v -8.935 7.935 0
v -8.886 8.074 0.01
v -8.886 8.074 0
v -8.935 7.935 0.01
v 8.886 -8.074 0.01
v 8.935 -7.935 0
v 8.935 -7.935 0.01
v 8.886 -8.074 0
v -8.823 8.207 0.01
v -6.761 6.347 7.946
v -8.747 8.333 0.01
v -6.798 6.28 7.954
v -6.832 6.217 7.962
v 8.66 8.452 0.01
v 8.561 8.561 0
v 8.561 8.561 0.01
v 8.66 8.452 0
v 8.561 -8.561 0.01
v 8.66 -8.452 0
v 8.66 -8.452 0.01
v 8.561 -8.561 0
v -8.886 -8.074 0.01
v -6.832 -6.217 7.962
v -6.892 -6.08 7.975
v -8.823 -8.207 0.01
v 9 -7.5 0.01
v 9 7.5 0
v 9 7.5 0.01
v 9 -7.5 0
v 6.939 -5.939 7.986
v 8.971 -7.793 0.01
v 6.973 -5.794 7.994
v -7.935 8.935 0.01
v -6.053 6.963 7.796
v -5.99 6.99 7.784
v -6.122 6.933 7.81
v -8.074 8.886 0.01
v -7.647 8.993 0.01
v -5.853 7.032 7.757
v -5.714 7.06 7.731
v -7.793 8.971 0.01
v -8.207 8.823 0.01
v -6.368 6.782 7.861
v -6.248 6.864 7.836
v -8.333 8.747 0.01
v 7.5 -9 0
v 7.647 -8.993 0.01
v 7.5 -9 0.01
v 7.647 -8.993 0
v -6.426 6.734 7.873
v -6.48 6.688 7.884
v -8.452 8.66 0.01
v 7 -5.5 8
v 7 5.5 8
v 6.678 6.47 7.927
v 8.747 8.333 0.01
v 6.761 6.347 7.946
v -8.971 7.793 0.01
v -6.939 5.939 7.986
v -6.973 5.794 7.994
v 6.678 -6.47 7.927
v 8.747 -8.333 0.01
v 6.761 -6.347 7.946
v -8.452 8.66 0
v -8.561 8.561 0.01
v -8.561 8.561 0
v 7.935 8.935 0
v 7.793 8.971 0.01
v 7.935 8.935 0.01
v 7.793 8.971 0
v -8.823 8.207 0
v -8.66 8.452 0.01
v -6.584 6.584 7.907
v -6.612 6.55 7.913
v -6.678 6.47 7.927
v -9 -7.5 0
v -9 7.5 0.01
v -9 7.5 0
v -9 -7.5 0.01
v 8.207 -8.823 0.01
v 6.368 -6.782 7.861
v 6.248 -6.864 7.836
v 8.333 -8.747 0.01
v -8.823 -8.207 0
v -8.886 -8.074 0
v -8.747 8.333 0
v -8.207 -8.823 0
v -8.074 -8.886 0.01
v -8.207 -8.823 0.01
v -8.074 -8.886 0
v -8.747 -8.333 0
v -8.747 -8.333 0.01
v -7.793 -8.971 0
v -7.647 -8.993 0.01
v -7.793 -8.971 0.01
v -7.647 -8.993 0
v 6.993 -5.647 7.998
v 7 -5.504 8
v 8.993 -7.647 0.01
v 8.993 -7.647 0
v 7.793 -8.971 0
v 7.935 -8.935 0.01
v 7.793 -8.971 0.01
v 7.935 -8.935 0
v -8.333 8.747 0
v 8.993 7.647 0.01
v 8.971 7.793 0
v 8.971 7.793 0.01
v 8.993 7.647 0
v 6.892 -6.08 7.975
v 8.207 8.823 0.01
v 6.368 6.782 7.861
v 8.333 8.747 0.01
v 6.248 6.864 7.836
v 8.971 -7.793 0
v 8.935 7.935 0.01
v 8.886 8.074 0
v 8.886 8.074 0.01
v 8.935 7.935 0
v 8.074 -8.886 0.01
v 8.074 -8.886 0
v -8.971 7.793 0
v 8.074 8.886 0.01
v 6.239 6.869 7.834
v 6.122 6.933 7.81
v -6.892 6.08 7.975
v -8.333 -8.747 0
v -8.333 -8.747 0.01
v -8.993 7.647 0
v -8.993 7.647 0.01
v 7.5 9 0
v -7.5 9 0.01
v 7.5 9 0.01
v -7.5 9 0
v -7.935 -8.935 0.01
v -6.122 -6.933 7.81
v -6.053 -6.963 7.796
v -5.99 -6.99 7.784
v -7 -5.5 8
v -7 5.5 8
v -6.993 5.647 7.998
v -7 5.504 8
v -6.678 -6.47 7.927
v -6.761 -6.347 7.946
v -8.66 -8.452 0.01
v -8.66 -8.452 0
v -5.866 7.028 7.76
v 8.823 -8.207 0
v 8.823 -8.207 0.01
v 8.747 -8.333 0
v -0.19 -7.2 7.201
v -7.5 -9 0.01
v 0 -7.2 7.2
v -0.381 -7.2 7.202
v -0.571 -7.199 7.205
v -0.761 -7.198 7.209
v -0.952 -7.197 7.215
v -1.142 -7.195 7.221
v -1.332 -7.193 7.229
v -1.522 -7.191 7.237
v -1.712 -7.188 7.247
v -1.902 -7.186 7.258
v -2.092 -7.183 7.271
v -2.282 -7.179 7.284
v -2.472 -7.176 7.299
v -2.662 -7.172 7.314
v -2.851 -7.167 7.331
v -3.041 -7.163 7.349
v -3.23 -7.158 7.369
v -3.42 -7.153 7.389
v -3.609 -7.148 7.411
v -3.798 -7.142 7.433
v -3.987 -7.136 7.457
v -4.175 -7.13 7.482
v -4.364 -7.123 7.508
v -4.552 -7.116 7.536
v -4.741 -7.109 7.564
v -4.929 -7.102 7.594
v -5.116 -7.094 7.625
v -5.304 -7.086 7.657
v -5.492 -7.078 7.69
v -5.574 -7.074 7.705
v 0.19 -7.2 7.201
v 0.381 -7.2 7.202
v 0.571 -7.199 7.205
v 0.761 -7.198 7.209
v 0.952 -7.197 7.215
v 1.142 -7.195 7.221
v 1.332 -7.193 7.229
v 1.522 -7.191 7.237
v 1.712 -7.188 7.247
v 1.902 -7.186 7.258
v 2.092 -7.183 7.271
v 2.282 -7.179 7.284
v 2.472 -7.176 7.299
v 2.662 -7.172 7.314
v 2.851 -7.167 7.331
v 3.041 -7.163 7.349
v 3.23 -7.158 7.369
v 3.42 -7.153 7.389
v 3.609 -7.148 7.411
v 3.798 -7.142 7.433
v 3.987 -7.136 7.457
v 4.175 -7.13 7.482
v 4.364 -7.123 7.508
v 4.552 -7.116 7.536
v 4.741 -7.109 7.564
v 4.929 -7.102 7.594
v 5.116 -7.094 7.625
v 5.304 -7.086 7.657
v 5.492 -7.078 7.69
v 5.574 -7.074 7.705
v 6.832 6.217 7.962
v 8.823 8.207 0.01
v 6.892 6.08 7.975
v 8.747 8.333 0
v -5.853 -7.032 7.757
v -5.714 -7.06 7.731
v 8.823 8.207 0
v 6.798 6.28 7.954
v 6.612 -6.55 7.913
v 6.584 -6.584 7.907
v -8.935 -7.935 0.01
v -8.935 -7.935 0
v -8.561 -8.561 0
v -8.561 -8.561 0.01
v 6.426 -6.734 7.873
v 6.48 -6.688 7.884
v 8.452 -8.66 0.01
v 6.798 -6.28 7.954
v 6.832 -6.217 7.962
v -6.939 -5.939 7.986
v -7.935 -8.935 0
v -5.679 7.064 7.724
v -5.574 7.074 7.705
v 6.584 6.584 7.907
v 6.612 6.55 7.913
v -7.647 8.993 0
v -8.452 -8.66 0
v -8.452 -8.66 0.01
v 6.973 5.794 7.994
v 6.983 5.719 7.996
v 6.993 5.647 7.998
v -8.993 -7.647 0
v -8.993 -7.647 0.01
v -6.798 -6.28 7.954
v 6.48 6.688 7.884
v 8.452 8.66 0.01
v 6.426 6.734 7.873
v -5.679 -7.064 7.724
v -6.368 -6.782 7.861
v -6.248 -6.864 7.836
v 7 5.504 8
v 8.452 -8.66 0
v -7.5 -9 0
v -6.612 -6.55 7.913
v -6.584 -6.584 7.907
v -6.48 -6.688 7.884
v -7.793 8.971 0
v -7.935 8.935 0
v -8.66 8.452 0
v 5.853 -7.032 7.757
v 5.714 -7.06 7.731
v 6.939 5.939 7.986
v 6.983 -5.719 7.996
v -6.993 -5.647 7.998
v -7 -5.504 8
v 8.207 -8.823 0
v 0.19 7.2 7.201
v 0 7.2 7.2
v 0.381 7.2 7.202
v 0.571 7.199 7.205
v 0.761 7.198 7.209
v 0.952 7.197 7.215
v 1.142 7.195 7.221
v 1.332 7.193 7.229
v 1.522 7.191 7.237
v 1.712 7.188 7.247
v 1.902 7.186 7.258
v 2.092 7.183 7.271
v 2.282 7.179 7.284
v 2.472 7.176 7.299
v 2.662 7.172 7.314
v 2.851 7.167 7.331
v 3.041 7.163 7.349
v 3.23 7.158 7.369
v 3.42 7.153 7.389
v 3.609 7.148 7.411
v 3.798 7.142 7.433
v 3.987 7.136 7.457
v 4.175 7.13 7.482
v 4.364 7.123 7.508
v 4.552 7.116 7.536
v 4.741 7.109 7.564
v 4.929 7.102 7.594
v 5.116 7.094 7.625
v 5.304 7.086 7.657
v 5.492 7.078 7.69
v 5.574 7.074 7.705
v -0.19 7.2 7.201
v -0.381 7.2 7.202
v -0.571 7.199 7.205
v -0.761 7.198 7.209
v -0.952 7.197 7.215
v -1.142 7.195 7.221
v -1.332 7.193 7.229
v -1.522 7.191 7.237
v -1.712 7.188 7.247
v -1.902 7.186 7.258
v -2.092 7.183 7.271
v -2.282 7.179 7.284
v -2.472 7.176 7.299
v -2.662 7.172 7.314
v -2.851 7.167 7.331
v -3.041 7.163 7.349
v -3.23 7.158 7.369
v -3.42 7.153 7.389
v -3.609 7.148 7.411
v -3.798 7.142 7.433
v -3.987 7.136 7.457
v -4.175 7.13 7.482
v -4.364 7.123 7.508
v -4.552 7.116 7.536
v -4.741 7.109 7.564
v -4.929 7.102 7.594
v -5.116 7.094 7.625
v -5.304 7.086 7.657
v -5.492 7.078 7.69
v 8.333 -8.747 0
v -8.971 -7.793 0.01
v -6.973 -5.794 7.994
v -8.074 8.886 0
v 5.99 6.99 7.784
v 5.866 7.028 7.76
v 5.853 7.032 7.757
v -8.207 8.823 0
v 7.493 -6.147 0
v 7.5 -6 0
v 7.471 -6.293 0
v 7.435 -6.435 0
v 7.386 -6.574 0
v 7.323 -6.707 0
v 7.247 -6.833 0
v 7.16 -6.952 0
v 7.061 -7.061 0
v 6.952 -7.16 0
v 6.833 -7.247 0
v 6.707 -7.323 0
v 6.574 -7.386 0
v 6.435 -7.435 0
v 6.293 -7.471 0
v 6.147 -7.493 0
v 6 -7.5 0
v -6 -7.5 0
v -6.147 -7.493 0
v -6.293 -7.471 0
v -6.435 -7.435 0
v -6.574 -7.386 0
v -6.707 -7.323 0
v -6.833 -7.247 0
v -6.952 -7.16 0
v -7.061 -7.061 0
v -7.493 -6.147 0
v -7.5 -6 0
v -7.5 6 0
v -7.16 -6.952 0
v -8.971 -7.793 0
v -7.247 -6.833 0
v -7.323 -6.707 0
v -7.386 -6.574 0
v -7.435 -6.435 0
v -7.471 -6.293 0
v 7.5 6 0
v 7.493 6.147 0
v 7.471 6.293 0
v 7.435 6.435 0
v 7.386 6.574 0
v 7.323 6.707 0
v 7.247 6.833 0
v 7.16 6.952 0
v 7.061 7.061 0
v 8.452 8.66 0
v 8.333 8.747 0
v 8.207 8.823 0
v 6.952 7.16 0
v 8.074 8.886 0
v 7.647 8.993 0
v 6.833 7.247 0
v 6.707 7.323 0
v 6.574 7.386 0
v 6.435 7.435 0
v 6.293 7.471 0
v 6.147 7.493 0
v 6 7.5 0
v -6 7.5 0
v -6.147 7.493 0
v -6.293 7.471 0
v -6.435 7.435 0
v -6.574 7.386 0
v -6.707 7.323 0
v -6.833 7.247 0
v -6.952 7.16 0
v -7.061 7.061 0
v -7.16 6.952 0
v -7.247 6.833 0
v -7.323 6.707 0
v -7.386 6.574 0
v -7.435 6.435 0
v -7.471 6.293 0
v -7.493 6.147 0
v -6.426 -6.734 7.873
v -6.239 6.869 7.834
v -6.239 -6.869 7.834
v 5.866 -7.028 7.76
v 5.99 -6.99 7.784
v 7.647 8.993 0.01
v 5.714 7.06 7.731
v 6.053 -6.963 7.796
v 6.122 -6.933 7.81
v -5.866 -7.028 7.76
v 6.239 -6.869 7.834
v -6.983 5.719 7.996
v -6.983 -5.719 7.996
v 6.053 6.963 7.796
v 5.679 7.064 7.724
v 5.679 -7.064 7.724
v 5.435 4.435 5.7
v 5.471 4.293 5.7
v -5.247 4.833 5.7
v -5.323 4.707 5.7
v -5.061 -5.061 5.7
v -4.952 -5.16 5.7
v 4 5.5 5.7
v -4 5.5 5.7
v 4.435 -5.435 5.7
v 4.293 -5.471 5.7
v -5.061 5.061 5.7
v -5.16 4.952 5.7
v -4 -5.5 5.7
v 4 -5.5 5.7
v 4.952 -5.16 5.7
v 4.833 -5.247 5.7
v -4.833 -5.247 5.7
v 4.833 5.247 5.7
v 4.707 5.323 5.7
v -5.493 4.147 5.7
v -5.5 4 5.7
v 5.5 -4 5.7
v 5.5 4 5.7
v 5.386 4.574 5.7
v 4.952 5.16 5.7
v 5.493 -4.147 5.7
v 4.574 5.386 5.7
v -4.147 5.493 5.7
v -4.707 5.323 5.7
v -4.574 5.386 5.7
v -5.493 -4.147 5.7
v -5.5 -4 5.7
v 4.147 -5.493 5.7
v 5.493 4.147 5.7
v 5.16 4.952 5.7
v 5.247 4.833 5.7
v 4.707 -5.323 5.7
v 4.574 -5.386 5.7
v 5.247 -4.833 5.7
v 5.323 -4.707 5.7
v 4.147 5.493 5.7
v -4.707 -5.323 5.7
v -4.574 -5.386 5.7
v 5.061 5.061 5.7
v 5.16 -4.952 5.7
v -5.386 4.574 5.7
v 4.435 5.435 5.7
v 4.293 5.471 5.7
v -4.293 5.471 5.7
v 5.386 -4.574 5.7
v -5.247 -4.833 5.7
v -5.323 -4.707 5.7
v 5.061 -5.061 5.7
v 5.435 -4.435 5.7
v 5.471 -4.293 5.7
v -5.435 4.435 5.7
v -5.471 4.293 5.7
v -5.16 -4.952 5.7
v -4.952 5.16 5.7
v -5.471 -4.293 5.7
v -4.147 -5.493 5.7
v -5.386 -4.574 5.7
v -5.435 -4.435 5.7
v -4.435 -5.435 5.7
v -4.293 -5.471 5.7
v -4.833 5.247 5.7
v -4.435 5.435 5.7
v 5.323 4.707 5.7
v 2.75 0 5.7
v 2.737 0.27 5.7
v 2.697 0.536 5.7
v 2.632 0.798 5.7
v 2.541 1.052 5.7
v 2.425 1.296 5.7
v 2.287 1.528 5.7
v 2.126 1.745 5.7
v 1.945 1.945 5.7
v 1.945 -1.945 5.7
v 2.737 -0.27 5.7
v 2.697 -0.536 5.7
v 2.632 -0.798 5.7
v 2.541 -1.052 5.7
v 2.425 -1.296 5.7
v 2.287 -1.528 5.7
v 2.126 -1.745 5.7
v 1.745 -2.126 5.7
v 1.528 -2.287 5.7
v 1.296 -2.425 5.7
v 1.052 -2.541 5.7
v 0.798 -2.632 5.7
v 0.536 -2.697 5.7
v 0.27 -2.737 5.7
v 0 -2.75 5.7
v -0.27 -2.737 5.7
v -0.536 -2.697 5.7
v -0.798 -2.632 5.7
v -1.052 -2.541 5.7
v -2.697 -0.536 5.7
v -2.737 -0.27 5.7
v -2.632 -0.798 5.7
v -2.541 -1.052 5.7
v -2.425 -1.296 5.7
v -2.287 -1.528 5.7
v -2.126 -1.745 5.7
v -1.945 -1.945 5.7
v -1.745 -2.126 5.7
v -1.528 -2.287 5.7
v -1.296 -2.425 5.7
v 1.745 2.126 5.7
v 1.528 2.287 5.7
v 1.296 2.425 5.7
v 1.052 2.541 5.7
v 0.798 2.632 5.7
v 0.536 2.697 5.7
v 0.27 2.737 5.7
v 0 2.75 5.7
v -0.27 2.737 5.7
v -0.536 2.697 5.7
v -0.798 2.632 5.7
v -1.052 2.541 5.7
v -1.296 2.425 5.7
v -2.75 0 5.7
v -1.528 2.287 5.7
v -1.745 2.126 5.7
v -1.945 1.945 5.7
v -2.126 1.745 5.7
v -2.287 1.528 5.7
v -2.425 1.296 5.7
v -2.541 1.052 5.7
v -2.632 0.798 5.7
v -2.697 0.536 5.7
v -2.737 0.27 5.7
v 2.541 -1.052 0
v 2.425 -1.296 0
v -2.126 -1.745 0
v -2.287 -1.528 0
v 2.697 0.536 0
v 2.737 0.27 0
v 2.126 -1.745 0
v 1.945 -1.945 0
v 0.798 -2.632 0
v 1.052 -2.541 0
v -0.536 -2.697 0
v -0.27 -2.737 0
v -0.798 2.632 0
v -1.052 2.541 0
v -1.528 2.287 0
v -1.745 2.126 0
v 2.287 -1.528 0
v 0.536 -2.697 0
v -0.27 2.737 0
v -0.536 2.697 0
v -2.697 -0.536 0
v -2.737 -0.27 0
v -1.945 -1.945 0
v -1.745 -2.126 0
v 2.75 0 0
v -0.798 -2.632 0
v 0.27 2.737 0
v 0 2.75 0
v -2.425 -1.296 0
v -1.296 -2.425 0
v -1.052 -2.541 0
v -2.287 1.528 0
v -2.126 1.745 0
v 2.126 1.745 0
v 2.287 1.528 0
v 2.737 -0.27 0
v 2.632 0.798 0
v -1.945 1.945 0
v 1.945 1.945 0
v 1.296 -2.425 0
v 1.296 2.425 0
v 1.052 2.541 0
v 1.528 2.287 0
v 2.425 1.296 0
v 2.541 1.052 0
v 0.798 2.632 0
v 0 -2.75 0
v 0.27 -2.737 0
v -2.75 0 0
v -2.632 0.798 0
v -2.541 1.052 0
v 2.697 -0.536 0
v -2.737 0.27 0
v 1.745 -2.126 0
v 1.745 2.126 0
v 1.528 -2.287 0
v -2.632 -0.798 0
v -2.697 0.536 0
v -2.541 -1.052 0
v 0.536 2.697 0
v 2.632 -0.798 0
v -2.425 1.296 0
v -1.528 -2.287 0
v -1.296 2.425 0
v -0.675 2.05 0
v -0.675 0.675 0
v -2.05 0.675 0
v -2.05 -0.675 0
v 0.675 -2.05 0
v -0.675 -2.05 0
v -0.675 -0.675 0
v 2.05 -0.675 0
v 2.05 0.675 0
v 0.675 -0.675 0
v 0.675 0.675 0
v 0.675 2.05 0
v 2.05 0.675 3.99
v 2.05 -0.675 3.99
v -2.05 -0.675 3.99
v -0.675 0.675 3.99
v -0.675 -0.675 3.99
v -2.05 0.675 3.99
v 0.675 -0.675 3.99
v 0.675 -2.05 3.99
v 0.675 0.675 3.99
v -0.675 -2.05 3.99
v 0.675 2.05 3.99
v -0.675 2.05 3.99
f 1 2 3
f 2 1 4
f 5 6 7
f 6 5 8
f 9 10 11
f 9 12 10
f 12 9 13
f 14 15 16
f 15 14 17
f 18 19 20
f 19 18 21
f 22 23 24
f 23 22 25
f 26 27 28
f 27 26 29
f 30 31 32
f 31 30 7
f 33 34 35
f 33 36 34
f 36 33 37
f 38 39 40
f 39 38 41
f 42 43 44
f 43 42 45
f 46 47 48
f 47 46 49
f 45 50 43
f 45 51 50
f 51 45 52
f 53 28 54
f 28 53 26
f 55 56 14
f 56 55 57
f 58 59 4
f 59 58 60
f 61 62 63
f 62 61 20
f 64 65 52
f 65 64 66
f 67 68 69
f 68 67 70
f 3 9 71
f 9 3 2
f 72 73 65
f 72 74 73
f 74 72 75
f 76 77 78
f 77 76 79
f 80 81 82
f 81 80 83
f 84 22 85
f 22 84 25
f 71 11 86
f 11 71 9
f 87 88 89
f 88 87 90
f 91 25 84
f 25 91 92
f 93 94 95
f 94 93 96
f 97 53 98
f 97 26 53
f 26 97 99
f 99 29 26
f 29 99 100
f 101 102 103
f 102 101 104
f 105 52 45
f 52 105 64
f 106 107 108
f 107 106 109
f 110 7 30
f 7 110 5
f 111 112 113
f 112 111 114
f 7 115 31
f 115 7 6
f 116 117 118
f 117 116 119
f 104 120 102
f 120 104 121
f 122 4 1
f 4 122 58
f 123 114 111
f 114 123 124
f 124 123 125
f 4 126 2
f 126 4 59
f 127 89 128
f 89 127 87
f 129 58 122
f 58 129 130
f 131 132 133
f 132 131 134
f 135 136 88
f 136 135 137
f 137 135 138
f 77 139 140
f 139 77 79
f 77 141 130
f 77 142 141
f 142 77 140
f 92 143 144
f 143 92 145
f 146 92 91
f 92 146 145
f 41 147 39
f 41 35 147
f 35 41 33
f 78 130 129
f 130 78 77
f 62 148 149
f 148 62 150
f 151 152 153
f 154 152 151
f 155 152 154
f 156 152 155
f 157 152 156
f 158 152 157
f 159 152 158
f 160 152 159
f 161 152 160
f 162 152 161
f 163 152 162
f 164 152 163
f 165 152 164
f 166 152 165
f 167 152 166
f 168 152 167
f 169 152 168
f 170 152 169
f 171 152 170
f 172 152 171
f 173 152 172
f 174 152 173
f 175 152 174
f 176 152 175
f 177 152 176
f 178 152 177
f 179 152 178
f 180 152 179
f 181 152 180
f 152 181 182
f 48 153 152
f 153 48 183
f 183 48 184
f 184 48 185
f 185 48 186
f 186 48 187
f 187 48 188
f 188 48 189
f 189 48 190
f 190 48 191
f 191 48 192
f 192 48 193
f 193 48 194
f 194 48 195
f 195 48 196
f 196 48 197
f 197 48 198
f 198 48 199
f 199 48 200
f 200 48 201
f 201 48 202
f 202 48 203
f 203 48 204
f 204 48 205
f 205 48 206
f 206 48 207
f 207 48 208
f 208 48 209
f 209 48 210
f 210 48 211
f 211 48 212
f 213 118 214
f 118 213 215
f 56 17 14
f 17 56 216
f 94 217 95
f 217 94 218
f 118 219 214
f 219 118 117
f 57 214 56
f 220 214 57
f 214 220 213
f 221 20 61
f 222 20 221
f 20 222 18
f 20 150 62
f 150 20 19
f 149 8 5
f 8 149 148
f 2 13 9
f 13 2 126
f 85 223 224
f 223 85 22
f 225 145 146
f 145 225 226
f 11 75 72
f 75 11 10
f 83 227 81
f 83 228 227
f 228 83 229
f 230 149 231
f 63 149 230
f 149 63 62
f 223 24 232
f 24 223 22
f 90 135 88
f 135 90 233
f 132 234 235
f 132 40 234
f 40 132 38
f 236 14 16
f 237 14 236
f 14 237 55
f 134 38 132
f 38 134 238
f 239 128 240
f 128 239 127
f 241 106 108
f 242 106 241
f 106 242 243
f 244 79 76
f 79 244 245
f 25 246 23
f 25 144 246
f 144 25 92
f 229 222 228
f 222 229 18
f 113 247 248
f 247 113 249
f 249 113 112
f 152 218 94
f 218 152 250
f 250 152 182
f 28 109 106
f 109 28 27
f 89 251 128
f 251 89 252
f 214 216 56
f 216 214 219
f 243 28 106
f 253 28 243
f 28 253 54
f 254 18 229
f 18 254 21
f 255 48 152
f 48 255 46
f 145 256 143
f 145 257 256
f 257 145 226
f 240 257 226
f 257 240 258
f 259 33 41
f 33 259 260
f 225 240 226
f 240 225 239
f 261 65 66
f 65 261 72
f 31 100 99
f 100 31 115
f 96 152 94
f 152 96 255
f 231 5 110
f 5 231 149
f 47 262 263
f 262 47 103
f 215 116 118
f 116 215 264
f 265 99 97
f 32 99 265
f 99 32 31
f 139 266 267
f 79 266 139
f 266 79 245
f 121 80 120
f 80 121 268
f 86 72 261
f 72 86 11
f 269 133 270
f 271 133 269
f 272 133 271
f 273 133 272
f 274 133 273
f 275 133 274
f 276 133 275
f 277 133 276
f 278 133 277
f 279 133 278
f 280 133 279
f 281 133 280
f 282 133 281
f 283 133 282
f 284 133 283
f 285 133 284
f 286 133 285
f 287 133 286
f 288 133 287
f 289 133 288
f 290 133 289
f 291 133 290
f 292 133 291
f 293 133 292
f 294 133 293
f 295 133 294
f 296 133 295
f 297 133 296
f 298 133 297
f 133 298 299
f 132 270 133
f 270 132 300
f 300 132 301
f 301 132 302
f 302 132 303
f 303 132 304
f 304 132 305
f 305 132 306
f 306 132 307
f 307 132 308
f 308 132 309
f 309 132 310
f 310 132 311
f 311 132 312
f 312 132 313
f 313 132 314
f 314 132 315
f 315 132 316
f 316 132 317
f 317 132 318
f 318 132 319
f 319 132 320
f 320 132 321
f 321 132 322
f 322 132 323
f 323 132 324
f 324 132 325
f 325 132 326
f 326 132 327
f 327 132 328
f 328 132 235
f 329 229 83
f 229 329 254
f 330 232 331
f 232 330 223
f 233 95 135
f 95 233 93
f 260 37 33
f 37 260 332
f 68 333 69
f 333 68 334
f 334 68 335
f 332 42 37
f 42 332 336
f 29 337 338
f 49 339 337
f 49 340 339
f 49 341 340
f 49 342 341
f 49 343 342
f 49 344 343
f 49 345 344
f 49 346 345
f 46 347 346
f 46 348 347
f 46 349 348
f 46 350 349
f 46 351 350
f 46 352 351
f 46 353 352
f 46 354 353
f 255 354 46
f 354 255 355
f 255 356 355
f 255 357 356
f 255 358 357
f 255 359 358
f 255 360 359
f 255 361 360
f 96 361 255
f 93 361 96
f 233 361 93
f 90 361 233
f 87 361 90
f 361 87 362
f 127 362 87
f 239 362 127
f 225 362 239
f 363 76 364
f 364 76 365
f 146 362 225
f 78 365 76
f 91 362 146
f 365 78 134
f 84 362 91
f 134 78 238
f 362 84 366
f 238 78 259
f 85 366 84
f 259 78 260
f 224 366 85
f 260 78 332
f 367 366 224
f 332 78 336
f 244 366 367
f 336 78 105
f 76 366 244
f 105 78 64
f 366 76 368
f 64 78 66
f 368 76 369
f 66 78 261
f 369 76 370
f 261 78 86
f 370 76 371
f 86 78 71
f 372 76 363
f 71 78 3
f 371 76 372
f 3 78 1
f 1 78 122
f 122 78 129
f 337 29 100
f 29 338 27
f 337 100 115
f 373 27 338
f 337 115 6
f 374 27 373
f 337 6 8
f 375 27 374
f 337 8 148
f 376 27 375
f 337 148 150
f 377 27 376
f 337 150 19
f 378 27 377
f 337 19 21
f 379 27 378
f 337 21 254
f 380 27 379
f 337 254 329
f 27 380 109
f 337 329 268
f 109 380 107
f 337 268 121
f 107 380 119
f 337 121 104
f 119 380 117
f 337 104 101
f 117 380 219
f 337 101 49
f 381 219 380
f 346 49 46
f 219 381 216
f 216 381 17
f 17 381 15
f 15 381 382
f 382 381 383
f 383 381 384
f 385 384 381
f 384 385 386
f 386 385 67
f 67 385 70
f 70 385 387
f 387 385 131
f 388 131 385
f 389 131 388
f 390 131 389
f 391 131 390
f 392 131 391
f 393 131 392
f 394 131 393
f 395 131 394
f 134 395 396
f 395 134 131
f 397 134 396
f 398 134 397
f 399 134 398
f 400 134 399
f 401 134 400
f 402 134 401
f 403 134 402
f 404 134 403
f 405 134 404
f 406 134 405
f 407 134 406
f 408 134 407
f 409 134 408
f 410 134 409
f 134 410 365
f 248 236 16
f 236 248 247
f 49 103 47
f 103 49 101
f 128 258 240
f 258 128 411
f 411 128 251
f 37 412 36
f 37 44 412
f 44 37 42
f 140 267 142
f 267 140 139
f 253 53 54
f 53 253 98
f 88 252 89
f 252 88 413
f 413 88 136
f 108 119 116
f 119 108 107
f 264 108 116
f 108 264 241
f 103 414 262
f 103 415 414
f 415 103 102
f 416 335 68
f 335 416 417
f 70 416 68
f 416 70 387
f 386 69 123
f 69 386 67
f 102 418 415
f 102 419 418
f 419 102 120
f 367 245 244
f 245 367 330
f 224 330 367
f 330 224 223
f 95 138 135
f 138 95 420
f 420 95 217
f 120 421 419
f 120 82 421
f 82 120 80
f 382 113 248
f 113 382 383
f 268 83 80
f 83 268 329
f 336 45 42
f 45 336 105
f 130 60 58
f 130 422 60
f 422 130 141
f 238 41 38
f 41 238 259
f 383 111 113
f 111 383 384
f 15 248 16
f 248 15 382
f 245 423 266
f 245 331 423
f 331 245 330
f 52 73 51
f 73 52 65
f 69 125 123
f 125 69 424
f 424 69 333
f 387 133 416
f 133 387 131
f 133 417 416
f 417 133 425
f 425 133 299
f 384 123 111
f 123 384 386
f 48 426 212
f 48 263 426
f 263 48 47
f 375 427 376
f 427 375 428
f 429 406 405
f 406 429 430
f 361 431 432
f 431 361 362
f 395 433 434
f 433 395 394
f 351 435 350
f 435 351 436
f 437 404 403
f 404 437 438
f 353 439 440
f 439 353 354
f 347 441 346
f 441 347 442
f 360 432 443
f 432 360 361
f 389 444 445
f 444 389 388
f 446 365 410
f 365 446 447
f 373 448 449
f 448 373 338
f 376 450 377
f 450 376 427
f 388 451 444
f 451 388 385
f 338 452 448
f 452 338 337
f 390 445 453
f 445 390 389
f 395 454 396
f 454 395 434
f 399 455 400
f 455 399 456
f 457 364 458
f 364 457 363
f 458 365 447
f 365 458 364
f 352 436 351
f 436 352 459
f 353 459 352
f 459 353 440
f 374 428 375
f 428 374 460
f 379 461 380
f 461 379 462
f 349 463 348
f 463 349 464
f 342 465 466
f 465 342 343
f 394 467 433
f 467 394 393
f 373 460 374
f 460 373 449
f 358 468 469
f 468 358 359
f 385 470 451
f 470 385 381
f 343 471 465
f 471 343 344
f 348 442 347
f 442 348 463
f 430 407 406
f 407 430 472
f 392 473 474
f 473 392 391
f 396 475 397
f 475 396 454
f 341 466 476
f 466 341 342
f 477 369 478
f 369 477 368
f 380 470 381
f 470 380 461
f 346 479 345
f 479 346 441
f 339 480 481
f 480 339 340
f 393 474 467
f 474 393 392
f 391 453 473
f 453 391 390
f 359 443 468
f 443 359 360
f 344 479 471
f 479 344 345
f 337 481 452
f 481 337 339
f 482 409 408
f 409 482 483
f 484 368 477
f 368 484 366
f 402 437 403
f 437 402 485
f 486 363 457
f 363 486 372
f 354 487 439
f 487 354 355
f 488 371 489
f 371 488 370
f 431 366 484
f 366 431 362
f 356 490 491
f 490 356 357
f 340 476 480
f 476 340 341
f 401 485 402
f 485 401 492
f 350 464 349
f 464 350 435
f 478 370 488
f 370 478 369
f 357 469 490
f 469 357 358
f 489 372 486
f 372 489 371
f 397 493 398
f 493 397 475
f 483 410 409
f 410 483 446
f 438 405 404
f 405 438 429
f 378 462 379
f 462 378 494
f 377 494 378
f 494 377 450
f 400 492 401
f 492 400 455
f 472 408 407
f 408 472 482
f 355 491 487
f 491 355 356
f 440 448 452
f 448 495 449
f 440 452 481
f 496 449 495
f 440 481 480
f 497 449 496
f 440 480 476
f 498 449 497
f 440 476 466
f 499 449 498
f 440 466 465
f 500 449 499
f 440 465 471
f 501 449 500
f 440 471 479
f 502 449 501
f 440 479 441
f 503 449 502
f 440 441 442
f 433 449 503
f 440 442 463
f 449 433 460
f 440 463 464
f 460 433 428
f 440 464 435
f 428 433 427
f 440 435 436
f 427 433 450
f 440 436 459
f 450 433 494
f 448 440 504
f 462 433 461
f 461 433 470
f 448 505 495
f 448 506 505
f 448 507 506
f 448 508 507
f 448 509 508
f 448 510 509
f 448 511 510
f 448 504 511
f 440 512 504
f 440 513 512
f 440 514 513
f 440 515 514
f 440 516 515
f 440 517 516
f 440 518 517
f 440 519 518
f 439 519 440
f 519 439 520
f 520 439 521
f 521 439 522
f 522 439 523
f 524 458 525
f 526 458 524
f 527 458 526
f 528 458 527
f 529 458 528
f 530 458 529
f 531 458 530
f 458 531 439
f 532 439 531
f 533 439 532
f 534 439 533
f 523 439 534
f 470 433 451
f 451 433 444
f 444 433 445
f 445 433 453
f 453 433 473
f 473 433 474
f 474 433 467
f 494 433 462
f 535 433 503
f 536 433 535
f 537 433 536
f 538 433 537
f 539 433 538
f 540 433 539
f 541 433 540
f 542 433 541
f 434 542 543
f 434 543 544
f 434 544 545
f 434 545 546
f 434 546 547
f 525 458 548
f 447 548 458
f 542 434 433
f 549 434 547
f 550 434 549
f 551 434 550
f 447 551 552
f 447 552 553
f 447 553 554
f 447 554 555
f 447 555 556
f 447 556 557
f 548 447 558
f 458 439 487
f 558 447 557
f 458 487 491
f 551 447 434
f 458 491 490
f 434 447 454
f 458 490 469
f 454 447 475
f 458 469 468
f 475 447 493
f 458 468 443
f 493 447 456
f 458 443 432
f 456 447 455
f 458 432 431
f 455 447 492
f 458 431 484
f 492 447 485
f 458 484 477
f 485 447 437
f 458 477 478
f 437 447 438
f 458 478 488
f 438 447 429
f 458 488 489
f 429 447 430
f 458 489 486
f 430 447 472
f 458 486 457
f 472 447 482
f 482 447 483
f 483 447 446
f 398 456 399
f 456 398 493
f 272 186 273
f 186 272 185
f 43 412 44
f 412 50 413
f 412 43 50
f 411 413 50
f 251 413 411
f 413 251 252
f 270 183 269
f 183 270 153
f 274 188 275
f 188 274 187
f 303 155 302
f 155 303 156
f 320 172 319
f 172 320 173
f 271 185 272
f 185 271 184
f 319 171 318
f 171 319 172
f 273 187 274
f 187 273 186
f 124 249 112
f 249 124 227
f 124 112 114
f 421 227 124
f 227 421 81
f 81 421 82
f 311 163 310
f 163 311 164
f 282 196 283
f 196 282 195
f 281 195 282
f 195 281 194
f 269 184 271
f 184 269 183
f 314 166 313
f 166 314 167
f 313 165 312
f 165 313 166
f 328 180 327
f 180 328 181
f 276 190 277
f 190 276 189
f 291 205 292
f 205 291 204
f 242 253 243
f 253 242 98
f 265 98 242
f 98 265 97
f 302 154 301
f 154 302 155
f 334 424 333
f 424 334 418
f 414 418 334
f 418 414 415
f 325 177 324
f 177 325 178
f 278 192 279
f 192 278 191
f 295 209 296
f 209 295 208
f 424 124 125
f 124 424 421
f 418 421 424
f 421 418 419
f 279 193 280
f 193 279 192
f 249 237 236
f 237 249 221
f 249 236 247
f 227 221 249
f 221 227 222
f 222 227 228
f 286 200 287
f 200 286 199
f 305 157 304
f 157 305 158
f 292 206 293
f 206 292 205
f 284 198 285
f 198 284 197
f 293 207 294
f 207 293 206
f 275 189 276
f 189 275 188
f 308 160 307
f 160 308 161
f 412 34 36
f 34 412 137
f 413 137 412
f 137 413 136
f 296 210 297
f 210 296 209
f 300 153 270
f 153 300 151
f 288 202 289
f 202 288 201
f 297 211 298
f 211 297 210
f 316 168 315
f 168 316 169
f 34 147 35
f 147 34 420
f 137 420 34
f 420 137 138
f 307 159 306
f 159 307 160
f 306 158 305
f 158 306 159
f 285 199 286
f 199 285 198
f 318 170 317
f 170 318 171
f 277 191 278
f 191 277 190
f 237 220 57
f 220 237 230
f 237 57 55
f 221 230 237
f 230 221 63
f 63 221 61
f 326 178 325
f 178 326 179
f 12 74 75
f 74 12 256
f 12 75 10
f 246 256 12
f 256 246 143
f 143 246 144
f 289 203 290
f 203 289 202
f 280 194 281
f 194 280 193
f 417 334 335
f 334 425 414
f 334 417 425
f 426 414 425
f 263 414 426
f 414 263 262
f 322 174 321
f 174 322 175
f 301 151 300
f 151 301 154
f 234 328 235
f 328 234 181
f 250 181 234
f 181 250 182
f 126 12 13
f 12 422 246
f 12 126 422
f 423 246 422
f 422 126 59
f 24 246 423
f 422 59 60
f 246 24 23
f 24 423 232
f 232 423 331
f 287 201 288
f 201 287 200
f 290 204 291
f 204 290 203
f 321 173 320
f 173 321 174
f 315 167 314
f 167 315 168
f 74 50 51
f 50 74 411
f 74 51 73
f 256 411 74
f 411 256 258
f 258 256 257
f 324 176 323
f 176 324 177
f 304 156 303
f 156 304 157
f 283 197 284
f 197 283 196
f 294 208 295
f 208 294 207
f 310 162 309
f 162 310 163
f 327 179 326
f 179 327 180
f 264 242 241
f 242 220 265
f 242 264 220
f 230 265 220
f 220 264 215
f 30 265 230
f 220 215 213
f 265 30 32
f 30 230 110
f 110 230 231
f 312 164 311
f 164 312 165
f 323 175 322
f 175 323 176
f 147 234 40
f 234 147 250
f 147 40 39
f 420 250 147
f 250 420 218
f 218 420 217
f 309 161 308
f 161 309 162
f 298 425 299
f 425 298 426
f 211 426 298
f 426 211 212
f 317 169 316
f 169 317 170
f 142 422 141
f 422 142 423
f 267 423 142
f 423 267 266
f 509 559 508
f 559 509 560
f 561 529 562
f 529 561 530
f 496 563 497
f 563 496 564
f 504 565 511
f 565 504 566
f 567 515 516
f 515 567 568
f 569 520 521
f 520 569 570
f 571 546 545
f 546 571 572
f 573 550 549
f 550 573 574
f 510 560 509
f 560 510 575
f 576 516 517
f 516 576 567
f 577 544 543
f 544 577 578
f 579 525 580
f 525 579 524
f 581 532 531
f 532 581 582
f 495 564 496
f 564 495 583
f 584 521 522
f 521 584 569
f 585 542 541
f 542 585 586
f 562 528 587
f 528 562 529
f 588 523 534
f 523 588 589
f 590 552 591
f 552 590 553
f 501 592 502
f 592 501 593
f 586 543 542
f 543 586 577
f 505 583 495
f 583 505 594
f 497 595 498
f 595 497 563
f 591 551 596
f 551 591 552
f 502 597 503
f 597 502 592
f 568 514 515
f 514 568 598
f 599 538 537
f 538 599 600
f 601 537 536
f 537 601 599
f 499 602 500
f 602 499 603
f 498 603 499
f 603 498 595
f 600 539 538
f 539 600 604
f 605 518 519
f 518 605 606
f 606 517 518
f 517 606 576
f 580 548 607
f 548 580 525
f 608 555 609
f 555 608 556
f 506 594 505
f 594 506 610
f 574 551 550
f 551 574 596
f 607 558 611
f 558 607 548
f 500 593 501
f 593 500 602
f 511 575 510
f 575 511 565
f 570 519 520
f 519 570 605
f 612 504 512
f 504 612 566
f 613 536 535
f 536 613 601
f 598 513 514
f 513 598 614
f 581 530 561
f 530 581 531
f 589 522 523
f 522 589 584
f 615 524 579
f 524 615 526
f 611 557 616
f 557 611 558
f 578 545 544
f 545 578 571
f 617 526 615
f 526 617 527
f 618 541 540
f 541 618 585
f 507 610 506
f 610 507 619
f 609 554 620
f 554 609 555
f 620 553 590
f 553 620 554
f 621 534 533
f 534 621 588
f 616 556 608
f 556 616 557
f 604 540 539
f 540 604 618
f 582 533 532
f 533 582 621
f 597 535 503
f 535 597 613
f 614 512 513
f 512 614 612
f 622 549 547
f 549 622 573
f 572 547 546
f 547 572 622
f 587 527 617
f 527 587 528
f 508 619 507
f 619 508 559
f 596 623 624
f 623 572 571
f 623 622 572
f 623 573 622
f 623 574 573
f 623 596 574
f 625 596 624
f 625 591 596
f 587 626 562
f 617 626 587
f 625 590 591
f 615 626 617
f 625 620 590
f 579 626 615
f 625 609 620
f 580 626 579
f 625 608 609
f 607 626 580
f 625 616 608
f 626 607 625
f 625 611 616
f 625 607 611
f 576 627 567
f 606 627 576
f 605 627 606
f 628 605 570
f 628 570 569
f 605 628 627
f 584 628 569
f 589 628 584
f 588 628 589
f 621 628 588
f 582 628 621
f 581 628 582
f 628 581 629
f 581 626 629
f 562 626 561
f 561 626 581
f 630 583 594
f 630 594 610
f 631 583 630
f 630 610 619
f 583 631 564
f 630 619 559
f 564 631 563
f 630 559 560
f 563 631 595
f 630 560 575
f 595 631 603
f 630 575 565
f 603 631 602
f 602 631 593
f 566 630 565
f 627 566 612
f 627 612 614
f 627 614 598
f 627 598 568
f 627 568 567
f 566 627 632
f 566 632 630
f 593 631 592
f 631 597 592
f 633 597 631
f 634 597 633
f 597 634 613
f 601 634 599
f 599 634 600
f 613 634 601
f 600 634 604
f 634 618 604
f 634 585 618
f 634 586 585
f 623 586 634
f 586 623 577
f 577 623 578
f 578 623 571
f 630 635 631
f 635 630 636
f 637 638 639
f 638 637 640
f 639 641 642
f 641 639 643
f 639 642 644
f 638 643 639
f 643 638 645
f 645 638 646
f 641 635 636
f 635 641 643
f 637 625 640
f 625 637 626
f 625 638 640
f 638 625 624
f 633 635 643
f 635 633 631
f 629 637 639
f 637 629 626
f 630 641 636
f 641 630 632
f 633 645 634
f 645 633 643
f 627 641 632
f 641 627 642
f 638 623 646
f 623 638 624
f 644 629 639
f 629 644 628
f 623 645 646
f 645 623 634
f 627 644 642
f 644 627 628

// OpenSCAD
// MakroPad Keycap – parametrisch (OpenSCAD)
//
// Blanko-Keycap fuer MX-kompatible Switches, 1u, flaches Profil mit leichter
// zylindrischer Mulde (alle Tasten gleich; die Neigung kommt vom Gehaeuse).
// Masse passen zum Platzhalter in makropad_case.scad (Unterseite 18 mm, Oberseite 14 mm).
//
// Export:
//   openscad -D 'printer="fdm"' -o makropad_keycap_fdm.stl makropad_keycap.scad
//   openscad -D 'printer="sla"' -o makropad_keycap_sla.stl makropad_keycap.scad
//
// Druck FDM: aufrecht, offene Unterseite auf dem Bett, keine Stuetzen.
//   Der Stempel steht bis auf das Bett, die Decke ueberbrueckt ca. 15 mm.
// Druck SLA: im Slicer 30-45 Grad kippen, Oberseite zur Plattform, Stuetzen nur an
//   Kante und Innenwand (nicht auf die Mulde). Kreuz vor dem Nachhaerten freimachen.

/* [Drucker] */
printer = "fdm"; // [fdm, sla]

/* [Kappe] */
base = 18;         // Kantenlaenge unten
top = 14;          // Kantenlaenge oben
height = 8;        // Gesamthoehe am Rand
corner_r = 1.5;    // Eckenradius
wall = 1.5;        // Wandstaerke seitlich
ceiling = 1.5;     // Deckenstaerke an der tiefsten Stelle der Mulde
dish_depth = 0.8;  // Tiefe der Mulde (zylindrisch)

/* [MX-Stempel] */
stem_d = 5.5;      // Aussendurchmesser
// Kreuzarme [Laenge, Breite], MX: 4.0 x 1.17 + Spiel (NACHMESSEN am Drucker)
cross_fdm = [4.1, 1.35];
cross_sla = [4.05, 1.25];  // Resin ist genauer und sproeder: weniger Spiel, eher locker als stramm
cross_depth = 4;   // Tiefe des Kreuzes (MX-Stempel ragt ca. 3.6 mm in die Kappe)

$fn = 64;

cross = printer == "sla" ? cross_sla : cross_fdm;
cross_l = cross[0];
cross_w = cross[1];
dish_r =(pow(top / 2, 2) + pow(dish_depth, 2)) / (2 * dish_depth);
inner_top = height - dish_depth - ceiling;

module rsq(s, h) {
    linear_extrude(h) offset(corner_r) square(s - 2 * corner_r, center = true);
}

module shell(b, t, h) {
    hull() {
        rsq(b, 0.01);
        translate([0, 0, h - 0.01]) rsq(t, 0.01);
    }
}

module keycap() {
    difference() {
        union() {
            difference() {
                shell(base, top, height);
                // Hohlraum, Wand folgt der Schraege
                translate([0, 0, -0.01]) shell(base - 2 * wall, top - 2 * wall, inner_top + 0.01);
                // Mulde: Zylinderachse vorne -> hinten, Kappe ist links/rechts gewoelbt
                translate([0, 0, height + dish_r - dish_depth]) rotate([90, 0, 0])
                    // feine Facetten (~0.2 mm), SLA bildet groebere sichtbar ab
                    cylinder(r = dish_r, h = base + 2, center = true, $fn = 1024);
            }
            cylinder(d = stem_d, h = inner_top + 0.01);
        }
        translate([0, 0, -0.01]) {
            translate([-cross_l / 2, -cross_w / 2, 0]) cube([cross_l, cross_w, cross_depth]);
            translate([-cross_w / 2, -cross_l / 2, 0]) cube([cross_w, cross_l, cross_depth]);
        }
    }
}

keycap();
